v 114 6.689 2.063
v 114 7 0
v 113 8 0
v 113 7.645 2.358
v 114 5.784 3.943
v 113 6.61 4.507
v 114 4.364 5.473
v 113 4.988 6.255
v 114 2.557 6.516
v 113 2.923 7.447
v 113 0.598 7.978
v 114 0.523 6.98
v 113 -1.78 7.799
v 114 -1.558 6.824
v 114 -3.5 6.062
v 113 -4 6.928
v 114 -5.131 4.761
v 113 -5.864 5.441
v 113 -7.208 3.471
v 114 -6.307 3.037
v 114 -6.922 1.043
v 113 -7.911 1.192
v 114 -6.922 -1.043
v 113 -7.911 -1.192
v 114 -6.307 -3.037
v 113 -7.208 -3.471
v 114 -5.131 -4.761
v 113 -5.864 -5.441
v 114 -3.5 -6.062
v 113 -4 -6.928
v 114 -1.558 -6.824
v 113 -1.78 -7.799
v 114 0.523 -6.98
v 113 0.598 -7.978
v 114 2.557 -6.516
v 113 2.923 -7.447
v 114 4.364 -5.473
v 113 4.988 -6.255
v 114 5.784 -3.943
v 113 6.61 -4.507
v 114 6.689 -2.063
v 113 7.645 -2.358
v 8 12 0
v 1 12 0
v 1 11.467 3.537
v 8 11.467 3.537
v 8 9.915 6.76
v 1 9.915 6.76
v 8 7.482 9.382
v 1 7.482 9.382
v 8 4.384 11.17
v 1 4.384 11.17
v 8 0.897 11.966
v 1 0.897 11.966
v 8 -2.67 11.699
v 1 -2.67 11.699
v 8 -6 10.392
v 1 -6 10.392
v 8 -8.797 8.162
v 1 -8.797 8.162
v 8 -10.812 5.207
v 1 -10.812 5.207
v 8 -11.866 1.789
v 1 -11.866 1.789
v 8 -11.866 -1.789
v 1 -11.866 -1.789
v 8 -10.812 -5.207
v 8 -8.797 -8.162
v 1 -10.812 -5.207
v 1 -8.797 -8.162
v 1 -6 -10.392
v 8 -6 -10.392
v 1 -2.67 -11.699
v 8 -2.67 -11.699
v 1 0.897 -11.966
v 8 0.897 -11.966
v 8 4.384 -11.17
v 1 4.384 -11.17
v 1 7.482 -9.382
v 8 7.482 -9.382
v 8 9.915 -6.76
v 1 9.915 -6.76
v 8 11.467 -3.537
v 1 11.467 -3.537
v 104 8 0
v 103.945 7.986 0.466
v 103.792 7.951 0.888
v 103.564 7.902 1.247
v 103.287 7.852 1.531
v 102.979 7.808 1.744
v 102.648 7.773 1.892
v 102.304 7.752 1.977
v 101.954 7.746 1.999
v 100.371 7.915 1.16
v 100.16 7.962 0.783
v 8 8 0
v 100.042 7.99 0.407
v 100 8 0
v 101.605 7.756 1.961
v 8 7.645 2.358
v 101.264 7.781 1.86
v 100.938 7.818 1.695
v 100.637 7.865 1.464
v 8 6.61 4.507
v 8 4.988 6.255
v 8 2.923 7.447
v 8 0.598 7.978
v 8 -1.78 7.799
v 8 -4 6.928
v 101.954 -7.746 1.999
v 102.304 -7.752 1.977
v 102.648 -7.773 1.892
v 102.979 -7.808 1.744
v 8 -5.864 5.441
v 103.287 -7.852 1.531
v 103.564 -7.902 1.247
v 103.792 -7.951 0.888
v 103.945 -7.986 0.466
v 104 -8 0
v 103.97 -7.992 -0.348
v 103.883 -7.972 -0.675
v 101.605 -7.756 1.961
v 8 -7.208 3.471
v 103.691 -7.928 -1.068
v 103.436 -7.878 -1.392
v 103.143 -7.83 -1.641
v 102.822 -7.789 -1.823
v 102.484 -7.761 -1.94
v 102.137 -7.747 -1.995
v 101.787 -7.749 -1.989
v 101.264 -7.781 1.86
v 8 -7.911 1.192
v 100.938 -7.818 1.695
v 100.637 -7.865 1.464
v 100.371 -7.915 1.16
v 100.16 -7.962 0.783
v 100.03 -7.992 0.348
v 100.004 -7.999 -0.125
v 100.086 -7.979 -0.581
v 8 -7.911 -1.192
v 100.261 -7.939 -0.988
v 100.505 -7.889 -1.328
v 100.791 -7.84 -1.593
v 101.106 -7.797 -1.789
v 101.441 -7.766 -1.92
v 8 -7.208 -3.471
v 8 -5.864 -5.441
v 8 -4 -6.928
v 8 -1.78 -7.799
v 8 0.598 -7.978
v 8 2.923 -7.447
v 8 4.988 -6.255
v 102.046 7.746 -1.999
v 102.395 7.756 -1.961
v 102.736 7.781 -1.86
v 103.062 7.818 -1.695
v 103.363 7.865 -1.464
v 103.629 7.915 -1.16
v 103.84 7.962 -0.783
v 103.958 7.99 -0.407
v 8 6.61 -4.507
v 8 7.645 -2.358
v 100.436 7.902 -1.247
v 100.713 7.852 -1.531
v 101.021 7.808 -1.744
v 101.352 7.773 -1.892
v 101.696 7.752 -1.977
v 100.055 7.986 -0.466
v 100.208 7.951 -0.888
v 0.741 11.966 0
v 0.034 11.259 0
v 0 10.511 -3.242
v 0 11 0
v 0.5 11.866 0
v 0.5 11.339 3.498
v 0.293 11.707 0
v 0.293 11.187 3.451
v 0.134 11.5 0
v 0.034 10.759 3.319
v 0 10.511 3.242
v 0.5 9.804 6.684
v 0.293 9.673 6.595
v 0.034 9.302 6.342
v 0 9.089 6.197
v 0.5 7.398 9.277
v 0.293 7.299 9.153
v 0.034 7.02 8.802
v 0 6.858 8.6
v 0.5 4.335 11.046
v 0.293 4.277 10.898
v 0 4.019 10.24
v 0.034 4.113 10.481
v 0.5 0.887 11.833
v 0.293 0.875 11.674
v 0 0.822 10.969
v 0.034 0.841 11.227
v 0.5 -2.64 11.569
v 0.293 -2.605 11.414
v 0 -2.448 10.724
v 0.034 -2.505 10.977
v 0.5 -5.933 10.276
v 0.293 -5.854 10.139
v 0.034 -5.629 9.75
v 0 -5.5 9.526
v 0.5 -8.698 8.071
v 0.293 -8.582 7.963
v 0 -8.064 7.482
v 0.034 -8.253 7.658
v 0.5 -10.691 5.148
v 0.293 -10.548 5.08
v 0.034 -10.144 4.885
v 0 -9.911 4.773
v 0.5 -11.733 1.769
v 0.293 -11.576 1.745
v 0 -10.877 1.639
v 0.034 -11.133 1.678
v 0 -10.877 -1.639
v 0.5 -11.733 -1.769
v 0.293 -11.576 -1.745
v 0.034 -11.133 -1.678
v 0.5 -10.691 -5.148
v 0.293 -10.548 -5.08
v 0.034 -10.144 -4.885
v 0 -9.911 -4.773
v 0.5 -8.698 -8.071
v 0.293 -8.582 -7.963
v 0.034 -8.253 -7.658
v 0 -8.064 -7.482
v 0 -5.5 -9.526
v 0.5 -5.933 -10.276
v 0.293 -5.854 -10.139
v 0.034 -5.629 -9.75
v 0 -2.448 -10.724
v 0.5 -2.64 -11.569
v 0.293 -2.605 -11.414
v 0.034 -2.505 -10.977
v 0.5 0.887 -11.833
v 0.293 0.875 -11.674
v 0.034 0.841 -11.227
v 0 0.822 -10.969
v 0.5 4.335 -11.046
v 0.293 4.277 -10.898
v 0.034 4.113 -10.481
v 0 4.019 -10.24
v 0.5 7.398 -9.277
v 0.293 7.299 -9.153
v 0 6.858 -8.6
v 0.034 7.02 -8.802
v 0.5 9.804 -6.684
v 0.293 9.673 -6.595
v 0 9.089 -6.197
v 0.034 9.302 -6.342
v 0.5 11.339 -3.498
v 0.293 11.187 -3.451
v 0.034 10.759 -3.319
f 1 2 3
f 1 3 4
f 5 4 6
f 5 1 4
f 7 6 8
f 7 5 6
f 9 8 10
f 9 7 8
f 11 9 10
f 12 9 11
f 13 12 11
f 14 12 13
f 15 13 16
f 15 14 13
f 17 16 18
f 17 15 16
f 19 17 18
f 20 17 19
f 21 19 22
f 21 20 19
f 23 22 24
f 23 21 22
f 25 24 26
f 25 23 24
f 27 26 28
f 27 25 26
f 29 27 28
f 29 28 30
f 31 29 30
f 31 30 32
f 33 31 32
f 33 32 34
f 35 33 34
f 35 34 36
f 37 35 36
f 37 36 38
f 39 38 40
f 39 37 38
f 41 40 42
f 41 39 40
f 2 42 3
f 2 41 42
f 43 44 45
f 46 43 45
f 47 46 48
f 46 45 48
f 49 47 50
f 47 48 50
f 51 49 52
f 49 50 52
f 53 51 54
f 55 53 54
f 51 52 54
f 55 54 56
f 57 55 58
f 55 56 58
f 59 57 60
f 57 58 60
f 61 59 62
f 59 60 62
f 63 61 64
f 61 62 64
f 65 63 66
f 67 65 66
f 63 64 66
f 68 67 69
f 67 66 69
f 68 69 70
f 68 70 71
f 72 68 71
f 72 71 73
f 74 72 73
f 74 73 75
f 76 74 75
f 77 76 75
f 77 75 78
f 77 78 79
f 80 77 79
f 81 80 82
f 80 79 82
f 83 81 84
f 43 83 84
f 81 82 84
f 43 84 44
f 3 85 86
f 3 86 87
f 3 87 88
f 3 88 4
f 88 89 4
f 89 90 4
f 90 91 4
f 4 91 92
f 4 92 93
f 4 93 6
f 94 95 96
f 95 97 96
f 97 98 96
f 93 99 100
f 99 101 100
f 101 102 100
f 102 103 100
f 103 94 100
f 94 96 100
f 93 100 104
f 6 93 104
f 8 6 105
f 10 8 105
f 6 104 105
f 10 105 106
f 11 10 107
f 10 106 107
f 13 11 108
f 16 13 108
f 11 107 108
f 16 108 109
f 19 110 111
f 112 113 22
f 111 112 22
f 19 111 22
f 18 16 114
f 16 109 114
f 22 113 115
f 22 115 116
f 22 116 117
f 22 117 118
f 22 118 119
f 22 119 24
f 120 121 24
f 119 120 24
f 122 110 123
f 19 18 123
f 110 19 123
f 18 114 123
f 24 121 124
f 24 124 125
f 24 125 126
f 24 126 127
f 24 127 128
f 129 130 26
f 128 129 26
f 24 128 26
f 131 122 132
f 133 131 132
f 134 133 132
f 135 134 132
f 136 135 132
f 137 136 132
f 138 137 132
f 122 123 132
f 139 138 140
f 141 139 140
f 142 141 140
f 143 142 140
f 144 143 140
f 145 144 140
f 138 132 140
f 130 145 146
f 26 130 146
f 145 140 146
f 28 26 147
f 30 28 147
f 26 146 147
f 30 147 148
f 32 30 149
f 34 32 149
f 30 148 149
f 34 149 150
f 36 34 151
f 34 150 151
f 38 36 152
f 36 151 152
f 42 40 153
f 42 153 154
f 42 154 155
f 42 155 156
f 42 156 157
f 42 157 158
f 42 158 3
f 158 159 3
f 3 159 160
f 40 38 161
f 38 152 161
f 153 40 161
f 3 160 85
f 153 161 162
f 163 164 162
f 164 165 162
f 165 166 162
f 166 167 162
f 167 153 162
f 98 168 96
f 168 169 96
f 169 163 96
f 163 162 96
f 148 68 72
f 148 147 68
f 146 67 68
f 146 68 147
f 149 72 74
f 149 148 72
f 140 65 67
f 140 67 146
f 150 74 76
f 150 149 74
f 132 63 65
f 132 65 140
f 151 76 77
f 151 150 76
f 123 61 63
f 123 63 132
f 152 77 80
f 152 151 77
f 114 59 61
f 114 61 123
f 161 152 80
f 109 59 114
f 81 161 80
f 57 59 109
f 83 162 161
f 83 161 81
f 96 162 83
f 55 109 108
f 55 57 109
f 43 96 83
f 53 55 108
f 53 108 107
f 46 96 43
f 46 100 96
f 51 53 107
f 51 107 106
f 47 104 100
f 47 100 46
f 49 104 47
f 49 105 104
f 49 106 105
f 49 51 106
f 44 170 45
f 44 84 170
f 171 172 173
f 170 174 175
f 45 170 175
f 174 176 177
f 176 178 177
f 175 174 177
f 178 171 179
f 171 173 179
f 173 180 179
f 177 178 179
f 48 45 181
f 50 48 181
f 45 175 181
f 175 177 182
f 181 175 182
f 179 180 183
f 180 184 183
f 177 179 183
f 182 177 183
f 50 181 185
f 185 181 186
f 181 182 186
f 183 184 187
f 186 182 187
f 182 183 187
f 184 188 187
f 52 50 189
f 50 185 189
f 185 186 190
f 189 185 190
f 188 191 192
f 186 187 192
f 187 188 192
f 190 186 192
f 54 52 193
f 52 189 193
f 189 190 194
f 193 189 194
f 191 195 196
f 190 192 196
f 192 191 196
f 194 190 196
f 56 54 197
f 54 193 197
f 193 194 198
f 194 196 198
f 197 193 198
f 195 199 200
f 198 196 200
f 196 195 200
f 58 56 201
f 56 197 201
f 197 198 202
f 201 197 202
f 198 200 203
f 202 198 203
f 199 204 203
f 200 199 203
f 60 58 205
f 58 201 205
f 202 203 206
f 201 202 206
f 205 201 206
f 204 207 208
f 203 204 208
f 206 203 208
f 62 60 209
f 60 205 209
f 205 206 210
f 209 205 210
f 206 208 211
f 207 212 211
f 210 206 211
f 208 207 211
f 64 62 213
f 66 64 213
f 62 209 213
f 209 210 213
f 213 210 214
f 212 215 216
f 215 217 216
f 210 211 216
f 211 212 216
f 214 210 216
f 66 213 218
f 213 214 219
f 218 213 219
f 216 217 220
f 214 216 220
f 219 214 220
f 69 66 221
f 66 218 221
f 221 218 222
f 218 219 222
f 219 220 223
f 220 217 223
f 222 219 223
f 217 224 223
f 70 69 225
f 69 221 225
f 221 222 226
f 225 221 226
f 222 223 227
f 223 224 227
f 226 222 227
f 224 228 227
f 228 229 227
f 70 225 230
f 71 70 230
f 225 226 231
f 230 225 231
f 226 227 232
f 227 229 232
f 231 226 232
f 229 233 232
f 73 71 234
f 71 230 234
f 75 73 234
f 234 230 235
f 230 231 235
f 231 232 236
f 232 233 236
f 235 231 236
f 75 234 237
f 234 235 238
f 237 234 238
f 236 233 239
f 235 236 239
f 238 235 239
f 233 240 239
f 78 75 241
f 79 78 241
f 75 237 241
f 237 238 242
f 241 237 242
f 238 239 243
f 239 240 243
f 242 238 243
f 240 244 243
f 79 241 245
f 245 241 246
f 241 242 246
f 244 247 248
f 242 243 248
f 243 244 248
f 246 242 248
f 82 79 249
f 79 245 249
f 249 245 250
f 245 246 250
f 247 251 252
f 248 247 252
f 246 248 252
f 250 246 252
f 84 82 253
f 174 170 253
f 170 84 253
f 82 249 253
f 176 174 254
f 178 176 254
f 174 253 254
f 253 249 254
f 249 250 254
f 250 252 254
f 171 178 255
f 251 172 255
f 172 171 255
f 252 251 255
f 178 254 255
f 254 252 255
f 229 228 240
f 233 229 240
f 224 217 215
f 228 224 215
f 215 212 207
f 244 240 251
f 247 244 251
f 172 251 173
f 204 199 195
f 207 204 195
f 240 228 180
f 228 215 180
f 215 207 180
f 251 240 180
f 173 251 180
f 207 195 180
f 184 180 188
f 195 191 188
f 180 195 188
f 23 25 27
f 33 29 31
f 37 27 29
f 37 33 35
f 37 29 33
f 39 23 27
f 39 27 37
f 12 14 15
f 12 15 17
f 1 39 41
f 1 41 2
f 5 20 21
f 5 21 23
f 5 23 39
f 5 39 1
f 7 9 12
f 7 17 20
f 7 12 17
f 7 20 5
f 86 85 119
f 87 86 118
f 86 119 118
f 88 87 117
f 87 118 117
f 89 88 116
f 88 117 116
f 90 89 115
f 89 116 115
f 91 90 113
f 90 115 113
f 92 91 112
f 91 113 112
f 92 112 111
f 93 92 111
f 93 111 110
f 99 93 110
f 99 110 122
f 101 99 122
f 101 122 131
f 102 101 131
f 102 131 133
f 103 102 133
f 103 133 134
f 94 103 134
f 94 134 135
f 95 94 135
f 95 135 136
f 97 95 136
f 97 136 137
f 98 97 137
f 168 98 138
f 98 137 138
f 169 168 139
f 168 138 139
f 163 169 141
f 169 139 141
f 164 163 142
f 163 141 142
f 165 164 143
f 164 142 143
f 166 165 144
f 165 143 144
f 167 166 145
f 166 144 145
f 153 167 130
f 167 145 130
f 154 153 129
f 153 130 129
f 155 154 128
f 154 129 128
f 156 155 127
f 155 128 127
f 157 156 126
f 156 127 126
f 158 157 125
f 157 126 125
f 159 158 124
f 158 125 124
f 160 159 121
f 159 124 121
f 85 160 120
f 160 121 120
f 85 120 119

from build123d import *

# Parameters (mm, degrees)
F0_R      = 12
F1_DEPTH  = 8
F2_R      = 1
F3_R      = 8
F4_DEPTH  = 105
F6_R      = 8
F7_DEPTH  = 1
F8_SIZE   = 1
F9_R      = 2
F10_DEPTH = 12.5


with BuildPart() as f1:
    # F0 (on Right) → F1 (new body)
    with BuildSketch(Plane.YZ):
        Circle(F0_R)
    extrude(amount=F1_DEPTH)

    # F2
    f2_edges = [f1.edges().sort_by_distance(p)[0] for p in [
        (0, -12, 0),
    ]]
    fillet(f2_edges, radius=F2_R)

    # F3 (on face) → F4 (join)
    with BuildSketch(Plane.YZ.offset(8)):
        Circle(F3_R)
    extrude(amount=F4_DEPTH)

    # F6 (on face) → F7 (join)
    with BuildSketch(Plane.YZ.offset(113)):
        Circle(F6_R)
    extrude(amount=F7_DEPTH)

    # F8
    f8_edges = [f1.edges().sort_by_distance(p)[0] for p in [
        (114, -8, 0),
    ]]
    chamfer(f8_edges, length=F8_SIZE)

    # F9 (on Front) → F10 (cut, symmetric)
    with BuildSketch(Plane.XZ):
        with Locations((102, 0)):
            Circle(F9_R)
    extrude(amount=F10_DEPTH, both=True, mode=Mode.SUBTRACT)


solid = f1.part
